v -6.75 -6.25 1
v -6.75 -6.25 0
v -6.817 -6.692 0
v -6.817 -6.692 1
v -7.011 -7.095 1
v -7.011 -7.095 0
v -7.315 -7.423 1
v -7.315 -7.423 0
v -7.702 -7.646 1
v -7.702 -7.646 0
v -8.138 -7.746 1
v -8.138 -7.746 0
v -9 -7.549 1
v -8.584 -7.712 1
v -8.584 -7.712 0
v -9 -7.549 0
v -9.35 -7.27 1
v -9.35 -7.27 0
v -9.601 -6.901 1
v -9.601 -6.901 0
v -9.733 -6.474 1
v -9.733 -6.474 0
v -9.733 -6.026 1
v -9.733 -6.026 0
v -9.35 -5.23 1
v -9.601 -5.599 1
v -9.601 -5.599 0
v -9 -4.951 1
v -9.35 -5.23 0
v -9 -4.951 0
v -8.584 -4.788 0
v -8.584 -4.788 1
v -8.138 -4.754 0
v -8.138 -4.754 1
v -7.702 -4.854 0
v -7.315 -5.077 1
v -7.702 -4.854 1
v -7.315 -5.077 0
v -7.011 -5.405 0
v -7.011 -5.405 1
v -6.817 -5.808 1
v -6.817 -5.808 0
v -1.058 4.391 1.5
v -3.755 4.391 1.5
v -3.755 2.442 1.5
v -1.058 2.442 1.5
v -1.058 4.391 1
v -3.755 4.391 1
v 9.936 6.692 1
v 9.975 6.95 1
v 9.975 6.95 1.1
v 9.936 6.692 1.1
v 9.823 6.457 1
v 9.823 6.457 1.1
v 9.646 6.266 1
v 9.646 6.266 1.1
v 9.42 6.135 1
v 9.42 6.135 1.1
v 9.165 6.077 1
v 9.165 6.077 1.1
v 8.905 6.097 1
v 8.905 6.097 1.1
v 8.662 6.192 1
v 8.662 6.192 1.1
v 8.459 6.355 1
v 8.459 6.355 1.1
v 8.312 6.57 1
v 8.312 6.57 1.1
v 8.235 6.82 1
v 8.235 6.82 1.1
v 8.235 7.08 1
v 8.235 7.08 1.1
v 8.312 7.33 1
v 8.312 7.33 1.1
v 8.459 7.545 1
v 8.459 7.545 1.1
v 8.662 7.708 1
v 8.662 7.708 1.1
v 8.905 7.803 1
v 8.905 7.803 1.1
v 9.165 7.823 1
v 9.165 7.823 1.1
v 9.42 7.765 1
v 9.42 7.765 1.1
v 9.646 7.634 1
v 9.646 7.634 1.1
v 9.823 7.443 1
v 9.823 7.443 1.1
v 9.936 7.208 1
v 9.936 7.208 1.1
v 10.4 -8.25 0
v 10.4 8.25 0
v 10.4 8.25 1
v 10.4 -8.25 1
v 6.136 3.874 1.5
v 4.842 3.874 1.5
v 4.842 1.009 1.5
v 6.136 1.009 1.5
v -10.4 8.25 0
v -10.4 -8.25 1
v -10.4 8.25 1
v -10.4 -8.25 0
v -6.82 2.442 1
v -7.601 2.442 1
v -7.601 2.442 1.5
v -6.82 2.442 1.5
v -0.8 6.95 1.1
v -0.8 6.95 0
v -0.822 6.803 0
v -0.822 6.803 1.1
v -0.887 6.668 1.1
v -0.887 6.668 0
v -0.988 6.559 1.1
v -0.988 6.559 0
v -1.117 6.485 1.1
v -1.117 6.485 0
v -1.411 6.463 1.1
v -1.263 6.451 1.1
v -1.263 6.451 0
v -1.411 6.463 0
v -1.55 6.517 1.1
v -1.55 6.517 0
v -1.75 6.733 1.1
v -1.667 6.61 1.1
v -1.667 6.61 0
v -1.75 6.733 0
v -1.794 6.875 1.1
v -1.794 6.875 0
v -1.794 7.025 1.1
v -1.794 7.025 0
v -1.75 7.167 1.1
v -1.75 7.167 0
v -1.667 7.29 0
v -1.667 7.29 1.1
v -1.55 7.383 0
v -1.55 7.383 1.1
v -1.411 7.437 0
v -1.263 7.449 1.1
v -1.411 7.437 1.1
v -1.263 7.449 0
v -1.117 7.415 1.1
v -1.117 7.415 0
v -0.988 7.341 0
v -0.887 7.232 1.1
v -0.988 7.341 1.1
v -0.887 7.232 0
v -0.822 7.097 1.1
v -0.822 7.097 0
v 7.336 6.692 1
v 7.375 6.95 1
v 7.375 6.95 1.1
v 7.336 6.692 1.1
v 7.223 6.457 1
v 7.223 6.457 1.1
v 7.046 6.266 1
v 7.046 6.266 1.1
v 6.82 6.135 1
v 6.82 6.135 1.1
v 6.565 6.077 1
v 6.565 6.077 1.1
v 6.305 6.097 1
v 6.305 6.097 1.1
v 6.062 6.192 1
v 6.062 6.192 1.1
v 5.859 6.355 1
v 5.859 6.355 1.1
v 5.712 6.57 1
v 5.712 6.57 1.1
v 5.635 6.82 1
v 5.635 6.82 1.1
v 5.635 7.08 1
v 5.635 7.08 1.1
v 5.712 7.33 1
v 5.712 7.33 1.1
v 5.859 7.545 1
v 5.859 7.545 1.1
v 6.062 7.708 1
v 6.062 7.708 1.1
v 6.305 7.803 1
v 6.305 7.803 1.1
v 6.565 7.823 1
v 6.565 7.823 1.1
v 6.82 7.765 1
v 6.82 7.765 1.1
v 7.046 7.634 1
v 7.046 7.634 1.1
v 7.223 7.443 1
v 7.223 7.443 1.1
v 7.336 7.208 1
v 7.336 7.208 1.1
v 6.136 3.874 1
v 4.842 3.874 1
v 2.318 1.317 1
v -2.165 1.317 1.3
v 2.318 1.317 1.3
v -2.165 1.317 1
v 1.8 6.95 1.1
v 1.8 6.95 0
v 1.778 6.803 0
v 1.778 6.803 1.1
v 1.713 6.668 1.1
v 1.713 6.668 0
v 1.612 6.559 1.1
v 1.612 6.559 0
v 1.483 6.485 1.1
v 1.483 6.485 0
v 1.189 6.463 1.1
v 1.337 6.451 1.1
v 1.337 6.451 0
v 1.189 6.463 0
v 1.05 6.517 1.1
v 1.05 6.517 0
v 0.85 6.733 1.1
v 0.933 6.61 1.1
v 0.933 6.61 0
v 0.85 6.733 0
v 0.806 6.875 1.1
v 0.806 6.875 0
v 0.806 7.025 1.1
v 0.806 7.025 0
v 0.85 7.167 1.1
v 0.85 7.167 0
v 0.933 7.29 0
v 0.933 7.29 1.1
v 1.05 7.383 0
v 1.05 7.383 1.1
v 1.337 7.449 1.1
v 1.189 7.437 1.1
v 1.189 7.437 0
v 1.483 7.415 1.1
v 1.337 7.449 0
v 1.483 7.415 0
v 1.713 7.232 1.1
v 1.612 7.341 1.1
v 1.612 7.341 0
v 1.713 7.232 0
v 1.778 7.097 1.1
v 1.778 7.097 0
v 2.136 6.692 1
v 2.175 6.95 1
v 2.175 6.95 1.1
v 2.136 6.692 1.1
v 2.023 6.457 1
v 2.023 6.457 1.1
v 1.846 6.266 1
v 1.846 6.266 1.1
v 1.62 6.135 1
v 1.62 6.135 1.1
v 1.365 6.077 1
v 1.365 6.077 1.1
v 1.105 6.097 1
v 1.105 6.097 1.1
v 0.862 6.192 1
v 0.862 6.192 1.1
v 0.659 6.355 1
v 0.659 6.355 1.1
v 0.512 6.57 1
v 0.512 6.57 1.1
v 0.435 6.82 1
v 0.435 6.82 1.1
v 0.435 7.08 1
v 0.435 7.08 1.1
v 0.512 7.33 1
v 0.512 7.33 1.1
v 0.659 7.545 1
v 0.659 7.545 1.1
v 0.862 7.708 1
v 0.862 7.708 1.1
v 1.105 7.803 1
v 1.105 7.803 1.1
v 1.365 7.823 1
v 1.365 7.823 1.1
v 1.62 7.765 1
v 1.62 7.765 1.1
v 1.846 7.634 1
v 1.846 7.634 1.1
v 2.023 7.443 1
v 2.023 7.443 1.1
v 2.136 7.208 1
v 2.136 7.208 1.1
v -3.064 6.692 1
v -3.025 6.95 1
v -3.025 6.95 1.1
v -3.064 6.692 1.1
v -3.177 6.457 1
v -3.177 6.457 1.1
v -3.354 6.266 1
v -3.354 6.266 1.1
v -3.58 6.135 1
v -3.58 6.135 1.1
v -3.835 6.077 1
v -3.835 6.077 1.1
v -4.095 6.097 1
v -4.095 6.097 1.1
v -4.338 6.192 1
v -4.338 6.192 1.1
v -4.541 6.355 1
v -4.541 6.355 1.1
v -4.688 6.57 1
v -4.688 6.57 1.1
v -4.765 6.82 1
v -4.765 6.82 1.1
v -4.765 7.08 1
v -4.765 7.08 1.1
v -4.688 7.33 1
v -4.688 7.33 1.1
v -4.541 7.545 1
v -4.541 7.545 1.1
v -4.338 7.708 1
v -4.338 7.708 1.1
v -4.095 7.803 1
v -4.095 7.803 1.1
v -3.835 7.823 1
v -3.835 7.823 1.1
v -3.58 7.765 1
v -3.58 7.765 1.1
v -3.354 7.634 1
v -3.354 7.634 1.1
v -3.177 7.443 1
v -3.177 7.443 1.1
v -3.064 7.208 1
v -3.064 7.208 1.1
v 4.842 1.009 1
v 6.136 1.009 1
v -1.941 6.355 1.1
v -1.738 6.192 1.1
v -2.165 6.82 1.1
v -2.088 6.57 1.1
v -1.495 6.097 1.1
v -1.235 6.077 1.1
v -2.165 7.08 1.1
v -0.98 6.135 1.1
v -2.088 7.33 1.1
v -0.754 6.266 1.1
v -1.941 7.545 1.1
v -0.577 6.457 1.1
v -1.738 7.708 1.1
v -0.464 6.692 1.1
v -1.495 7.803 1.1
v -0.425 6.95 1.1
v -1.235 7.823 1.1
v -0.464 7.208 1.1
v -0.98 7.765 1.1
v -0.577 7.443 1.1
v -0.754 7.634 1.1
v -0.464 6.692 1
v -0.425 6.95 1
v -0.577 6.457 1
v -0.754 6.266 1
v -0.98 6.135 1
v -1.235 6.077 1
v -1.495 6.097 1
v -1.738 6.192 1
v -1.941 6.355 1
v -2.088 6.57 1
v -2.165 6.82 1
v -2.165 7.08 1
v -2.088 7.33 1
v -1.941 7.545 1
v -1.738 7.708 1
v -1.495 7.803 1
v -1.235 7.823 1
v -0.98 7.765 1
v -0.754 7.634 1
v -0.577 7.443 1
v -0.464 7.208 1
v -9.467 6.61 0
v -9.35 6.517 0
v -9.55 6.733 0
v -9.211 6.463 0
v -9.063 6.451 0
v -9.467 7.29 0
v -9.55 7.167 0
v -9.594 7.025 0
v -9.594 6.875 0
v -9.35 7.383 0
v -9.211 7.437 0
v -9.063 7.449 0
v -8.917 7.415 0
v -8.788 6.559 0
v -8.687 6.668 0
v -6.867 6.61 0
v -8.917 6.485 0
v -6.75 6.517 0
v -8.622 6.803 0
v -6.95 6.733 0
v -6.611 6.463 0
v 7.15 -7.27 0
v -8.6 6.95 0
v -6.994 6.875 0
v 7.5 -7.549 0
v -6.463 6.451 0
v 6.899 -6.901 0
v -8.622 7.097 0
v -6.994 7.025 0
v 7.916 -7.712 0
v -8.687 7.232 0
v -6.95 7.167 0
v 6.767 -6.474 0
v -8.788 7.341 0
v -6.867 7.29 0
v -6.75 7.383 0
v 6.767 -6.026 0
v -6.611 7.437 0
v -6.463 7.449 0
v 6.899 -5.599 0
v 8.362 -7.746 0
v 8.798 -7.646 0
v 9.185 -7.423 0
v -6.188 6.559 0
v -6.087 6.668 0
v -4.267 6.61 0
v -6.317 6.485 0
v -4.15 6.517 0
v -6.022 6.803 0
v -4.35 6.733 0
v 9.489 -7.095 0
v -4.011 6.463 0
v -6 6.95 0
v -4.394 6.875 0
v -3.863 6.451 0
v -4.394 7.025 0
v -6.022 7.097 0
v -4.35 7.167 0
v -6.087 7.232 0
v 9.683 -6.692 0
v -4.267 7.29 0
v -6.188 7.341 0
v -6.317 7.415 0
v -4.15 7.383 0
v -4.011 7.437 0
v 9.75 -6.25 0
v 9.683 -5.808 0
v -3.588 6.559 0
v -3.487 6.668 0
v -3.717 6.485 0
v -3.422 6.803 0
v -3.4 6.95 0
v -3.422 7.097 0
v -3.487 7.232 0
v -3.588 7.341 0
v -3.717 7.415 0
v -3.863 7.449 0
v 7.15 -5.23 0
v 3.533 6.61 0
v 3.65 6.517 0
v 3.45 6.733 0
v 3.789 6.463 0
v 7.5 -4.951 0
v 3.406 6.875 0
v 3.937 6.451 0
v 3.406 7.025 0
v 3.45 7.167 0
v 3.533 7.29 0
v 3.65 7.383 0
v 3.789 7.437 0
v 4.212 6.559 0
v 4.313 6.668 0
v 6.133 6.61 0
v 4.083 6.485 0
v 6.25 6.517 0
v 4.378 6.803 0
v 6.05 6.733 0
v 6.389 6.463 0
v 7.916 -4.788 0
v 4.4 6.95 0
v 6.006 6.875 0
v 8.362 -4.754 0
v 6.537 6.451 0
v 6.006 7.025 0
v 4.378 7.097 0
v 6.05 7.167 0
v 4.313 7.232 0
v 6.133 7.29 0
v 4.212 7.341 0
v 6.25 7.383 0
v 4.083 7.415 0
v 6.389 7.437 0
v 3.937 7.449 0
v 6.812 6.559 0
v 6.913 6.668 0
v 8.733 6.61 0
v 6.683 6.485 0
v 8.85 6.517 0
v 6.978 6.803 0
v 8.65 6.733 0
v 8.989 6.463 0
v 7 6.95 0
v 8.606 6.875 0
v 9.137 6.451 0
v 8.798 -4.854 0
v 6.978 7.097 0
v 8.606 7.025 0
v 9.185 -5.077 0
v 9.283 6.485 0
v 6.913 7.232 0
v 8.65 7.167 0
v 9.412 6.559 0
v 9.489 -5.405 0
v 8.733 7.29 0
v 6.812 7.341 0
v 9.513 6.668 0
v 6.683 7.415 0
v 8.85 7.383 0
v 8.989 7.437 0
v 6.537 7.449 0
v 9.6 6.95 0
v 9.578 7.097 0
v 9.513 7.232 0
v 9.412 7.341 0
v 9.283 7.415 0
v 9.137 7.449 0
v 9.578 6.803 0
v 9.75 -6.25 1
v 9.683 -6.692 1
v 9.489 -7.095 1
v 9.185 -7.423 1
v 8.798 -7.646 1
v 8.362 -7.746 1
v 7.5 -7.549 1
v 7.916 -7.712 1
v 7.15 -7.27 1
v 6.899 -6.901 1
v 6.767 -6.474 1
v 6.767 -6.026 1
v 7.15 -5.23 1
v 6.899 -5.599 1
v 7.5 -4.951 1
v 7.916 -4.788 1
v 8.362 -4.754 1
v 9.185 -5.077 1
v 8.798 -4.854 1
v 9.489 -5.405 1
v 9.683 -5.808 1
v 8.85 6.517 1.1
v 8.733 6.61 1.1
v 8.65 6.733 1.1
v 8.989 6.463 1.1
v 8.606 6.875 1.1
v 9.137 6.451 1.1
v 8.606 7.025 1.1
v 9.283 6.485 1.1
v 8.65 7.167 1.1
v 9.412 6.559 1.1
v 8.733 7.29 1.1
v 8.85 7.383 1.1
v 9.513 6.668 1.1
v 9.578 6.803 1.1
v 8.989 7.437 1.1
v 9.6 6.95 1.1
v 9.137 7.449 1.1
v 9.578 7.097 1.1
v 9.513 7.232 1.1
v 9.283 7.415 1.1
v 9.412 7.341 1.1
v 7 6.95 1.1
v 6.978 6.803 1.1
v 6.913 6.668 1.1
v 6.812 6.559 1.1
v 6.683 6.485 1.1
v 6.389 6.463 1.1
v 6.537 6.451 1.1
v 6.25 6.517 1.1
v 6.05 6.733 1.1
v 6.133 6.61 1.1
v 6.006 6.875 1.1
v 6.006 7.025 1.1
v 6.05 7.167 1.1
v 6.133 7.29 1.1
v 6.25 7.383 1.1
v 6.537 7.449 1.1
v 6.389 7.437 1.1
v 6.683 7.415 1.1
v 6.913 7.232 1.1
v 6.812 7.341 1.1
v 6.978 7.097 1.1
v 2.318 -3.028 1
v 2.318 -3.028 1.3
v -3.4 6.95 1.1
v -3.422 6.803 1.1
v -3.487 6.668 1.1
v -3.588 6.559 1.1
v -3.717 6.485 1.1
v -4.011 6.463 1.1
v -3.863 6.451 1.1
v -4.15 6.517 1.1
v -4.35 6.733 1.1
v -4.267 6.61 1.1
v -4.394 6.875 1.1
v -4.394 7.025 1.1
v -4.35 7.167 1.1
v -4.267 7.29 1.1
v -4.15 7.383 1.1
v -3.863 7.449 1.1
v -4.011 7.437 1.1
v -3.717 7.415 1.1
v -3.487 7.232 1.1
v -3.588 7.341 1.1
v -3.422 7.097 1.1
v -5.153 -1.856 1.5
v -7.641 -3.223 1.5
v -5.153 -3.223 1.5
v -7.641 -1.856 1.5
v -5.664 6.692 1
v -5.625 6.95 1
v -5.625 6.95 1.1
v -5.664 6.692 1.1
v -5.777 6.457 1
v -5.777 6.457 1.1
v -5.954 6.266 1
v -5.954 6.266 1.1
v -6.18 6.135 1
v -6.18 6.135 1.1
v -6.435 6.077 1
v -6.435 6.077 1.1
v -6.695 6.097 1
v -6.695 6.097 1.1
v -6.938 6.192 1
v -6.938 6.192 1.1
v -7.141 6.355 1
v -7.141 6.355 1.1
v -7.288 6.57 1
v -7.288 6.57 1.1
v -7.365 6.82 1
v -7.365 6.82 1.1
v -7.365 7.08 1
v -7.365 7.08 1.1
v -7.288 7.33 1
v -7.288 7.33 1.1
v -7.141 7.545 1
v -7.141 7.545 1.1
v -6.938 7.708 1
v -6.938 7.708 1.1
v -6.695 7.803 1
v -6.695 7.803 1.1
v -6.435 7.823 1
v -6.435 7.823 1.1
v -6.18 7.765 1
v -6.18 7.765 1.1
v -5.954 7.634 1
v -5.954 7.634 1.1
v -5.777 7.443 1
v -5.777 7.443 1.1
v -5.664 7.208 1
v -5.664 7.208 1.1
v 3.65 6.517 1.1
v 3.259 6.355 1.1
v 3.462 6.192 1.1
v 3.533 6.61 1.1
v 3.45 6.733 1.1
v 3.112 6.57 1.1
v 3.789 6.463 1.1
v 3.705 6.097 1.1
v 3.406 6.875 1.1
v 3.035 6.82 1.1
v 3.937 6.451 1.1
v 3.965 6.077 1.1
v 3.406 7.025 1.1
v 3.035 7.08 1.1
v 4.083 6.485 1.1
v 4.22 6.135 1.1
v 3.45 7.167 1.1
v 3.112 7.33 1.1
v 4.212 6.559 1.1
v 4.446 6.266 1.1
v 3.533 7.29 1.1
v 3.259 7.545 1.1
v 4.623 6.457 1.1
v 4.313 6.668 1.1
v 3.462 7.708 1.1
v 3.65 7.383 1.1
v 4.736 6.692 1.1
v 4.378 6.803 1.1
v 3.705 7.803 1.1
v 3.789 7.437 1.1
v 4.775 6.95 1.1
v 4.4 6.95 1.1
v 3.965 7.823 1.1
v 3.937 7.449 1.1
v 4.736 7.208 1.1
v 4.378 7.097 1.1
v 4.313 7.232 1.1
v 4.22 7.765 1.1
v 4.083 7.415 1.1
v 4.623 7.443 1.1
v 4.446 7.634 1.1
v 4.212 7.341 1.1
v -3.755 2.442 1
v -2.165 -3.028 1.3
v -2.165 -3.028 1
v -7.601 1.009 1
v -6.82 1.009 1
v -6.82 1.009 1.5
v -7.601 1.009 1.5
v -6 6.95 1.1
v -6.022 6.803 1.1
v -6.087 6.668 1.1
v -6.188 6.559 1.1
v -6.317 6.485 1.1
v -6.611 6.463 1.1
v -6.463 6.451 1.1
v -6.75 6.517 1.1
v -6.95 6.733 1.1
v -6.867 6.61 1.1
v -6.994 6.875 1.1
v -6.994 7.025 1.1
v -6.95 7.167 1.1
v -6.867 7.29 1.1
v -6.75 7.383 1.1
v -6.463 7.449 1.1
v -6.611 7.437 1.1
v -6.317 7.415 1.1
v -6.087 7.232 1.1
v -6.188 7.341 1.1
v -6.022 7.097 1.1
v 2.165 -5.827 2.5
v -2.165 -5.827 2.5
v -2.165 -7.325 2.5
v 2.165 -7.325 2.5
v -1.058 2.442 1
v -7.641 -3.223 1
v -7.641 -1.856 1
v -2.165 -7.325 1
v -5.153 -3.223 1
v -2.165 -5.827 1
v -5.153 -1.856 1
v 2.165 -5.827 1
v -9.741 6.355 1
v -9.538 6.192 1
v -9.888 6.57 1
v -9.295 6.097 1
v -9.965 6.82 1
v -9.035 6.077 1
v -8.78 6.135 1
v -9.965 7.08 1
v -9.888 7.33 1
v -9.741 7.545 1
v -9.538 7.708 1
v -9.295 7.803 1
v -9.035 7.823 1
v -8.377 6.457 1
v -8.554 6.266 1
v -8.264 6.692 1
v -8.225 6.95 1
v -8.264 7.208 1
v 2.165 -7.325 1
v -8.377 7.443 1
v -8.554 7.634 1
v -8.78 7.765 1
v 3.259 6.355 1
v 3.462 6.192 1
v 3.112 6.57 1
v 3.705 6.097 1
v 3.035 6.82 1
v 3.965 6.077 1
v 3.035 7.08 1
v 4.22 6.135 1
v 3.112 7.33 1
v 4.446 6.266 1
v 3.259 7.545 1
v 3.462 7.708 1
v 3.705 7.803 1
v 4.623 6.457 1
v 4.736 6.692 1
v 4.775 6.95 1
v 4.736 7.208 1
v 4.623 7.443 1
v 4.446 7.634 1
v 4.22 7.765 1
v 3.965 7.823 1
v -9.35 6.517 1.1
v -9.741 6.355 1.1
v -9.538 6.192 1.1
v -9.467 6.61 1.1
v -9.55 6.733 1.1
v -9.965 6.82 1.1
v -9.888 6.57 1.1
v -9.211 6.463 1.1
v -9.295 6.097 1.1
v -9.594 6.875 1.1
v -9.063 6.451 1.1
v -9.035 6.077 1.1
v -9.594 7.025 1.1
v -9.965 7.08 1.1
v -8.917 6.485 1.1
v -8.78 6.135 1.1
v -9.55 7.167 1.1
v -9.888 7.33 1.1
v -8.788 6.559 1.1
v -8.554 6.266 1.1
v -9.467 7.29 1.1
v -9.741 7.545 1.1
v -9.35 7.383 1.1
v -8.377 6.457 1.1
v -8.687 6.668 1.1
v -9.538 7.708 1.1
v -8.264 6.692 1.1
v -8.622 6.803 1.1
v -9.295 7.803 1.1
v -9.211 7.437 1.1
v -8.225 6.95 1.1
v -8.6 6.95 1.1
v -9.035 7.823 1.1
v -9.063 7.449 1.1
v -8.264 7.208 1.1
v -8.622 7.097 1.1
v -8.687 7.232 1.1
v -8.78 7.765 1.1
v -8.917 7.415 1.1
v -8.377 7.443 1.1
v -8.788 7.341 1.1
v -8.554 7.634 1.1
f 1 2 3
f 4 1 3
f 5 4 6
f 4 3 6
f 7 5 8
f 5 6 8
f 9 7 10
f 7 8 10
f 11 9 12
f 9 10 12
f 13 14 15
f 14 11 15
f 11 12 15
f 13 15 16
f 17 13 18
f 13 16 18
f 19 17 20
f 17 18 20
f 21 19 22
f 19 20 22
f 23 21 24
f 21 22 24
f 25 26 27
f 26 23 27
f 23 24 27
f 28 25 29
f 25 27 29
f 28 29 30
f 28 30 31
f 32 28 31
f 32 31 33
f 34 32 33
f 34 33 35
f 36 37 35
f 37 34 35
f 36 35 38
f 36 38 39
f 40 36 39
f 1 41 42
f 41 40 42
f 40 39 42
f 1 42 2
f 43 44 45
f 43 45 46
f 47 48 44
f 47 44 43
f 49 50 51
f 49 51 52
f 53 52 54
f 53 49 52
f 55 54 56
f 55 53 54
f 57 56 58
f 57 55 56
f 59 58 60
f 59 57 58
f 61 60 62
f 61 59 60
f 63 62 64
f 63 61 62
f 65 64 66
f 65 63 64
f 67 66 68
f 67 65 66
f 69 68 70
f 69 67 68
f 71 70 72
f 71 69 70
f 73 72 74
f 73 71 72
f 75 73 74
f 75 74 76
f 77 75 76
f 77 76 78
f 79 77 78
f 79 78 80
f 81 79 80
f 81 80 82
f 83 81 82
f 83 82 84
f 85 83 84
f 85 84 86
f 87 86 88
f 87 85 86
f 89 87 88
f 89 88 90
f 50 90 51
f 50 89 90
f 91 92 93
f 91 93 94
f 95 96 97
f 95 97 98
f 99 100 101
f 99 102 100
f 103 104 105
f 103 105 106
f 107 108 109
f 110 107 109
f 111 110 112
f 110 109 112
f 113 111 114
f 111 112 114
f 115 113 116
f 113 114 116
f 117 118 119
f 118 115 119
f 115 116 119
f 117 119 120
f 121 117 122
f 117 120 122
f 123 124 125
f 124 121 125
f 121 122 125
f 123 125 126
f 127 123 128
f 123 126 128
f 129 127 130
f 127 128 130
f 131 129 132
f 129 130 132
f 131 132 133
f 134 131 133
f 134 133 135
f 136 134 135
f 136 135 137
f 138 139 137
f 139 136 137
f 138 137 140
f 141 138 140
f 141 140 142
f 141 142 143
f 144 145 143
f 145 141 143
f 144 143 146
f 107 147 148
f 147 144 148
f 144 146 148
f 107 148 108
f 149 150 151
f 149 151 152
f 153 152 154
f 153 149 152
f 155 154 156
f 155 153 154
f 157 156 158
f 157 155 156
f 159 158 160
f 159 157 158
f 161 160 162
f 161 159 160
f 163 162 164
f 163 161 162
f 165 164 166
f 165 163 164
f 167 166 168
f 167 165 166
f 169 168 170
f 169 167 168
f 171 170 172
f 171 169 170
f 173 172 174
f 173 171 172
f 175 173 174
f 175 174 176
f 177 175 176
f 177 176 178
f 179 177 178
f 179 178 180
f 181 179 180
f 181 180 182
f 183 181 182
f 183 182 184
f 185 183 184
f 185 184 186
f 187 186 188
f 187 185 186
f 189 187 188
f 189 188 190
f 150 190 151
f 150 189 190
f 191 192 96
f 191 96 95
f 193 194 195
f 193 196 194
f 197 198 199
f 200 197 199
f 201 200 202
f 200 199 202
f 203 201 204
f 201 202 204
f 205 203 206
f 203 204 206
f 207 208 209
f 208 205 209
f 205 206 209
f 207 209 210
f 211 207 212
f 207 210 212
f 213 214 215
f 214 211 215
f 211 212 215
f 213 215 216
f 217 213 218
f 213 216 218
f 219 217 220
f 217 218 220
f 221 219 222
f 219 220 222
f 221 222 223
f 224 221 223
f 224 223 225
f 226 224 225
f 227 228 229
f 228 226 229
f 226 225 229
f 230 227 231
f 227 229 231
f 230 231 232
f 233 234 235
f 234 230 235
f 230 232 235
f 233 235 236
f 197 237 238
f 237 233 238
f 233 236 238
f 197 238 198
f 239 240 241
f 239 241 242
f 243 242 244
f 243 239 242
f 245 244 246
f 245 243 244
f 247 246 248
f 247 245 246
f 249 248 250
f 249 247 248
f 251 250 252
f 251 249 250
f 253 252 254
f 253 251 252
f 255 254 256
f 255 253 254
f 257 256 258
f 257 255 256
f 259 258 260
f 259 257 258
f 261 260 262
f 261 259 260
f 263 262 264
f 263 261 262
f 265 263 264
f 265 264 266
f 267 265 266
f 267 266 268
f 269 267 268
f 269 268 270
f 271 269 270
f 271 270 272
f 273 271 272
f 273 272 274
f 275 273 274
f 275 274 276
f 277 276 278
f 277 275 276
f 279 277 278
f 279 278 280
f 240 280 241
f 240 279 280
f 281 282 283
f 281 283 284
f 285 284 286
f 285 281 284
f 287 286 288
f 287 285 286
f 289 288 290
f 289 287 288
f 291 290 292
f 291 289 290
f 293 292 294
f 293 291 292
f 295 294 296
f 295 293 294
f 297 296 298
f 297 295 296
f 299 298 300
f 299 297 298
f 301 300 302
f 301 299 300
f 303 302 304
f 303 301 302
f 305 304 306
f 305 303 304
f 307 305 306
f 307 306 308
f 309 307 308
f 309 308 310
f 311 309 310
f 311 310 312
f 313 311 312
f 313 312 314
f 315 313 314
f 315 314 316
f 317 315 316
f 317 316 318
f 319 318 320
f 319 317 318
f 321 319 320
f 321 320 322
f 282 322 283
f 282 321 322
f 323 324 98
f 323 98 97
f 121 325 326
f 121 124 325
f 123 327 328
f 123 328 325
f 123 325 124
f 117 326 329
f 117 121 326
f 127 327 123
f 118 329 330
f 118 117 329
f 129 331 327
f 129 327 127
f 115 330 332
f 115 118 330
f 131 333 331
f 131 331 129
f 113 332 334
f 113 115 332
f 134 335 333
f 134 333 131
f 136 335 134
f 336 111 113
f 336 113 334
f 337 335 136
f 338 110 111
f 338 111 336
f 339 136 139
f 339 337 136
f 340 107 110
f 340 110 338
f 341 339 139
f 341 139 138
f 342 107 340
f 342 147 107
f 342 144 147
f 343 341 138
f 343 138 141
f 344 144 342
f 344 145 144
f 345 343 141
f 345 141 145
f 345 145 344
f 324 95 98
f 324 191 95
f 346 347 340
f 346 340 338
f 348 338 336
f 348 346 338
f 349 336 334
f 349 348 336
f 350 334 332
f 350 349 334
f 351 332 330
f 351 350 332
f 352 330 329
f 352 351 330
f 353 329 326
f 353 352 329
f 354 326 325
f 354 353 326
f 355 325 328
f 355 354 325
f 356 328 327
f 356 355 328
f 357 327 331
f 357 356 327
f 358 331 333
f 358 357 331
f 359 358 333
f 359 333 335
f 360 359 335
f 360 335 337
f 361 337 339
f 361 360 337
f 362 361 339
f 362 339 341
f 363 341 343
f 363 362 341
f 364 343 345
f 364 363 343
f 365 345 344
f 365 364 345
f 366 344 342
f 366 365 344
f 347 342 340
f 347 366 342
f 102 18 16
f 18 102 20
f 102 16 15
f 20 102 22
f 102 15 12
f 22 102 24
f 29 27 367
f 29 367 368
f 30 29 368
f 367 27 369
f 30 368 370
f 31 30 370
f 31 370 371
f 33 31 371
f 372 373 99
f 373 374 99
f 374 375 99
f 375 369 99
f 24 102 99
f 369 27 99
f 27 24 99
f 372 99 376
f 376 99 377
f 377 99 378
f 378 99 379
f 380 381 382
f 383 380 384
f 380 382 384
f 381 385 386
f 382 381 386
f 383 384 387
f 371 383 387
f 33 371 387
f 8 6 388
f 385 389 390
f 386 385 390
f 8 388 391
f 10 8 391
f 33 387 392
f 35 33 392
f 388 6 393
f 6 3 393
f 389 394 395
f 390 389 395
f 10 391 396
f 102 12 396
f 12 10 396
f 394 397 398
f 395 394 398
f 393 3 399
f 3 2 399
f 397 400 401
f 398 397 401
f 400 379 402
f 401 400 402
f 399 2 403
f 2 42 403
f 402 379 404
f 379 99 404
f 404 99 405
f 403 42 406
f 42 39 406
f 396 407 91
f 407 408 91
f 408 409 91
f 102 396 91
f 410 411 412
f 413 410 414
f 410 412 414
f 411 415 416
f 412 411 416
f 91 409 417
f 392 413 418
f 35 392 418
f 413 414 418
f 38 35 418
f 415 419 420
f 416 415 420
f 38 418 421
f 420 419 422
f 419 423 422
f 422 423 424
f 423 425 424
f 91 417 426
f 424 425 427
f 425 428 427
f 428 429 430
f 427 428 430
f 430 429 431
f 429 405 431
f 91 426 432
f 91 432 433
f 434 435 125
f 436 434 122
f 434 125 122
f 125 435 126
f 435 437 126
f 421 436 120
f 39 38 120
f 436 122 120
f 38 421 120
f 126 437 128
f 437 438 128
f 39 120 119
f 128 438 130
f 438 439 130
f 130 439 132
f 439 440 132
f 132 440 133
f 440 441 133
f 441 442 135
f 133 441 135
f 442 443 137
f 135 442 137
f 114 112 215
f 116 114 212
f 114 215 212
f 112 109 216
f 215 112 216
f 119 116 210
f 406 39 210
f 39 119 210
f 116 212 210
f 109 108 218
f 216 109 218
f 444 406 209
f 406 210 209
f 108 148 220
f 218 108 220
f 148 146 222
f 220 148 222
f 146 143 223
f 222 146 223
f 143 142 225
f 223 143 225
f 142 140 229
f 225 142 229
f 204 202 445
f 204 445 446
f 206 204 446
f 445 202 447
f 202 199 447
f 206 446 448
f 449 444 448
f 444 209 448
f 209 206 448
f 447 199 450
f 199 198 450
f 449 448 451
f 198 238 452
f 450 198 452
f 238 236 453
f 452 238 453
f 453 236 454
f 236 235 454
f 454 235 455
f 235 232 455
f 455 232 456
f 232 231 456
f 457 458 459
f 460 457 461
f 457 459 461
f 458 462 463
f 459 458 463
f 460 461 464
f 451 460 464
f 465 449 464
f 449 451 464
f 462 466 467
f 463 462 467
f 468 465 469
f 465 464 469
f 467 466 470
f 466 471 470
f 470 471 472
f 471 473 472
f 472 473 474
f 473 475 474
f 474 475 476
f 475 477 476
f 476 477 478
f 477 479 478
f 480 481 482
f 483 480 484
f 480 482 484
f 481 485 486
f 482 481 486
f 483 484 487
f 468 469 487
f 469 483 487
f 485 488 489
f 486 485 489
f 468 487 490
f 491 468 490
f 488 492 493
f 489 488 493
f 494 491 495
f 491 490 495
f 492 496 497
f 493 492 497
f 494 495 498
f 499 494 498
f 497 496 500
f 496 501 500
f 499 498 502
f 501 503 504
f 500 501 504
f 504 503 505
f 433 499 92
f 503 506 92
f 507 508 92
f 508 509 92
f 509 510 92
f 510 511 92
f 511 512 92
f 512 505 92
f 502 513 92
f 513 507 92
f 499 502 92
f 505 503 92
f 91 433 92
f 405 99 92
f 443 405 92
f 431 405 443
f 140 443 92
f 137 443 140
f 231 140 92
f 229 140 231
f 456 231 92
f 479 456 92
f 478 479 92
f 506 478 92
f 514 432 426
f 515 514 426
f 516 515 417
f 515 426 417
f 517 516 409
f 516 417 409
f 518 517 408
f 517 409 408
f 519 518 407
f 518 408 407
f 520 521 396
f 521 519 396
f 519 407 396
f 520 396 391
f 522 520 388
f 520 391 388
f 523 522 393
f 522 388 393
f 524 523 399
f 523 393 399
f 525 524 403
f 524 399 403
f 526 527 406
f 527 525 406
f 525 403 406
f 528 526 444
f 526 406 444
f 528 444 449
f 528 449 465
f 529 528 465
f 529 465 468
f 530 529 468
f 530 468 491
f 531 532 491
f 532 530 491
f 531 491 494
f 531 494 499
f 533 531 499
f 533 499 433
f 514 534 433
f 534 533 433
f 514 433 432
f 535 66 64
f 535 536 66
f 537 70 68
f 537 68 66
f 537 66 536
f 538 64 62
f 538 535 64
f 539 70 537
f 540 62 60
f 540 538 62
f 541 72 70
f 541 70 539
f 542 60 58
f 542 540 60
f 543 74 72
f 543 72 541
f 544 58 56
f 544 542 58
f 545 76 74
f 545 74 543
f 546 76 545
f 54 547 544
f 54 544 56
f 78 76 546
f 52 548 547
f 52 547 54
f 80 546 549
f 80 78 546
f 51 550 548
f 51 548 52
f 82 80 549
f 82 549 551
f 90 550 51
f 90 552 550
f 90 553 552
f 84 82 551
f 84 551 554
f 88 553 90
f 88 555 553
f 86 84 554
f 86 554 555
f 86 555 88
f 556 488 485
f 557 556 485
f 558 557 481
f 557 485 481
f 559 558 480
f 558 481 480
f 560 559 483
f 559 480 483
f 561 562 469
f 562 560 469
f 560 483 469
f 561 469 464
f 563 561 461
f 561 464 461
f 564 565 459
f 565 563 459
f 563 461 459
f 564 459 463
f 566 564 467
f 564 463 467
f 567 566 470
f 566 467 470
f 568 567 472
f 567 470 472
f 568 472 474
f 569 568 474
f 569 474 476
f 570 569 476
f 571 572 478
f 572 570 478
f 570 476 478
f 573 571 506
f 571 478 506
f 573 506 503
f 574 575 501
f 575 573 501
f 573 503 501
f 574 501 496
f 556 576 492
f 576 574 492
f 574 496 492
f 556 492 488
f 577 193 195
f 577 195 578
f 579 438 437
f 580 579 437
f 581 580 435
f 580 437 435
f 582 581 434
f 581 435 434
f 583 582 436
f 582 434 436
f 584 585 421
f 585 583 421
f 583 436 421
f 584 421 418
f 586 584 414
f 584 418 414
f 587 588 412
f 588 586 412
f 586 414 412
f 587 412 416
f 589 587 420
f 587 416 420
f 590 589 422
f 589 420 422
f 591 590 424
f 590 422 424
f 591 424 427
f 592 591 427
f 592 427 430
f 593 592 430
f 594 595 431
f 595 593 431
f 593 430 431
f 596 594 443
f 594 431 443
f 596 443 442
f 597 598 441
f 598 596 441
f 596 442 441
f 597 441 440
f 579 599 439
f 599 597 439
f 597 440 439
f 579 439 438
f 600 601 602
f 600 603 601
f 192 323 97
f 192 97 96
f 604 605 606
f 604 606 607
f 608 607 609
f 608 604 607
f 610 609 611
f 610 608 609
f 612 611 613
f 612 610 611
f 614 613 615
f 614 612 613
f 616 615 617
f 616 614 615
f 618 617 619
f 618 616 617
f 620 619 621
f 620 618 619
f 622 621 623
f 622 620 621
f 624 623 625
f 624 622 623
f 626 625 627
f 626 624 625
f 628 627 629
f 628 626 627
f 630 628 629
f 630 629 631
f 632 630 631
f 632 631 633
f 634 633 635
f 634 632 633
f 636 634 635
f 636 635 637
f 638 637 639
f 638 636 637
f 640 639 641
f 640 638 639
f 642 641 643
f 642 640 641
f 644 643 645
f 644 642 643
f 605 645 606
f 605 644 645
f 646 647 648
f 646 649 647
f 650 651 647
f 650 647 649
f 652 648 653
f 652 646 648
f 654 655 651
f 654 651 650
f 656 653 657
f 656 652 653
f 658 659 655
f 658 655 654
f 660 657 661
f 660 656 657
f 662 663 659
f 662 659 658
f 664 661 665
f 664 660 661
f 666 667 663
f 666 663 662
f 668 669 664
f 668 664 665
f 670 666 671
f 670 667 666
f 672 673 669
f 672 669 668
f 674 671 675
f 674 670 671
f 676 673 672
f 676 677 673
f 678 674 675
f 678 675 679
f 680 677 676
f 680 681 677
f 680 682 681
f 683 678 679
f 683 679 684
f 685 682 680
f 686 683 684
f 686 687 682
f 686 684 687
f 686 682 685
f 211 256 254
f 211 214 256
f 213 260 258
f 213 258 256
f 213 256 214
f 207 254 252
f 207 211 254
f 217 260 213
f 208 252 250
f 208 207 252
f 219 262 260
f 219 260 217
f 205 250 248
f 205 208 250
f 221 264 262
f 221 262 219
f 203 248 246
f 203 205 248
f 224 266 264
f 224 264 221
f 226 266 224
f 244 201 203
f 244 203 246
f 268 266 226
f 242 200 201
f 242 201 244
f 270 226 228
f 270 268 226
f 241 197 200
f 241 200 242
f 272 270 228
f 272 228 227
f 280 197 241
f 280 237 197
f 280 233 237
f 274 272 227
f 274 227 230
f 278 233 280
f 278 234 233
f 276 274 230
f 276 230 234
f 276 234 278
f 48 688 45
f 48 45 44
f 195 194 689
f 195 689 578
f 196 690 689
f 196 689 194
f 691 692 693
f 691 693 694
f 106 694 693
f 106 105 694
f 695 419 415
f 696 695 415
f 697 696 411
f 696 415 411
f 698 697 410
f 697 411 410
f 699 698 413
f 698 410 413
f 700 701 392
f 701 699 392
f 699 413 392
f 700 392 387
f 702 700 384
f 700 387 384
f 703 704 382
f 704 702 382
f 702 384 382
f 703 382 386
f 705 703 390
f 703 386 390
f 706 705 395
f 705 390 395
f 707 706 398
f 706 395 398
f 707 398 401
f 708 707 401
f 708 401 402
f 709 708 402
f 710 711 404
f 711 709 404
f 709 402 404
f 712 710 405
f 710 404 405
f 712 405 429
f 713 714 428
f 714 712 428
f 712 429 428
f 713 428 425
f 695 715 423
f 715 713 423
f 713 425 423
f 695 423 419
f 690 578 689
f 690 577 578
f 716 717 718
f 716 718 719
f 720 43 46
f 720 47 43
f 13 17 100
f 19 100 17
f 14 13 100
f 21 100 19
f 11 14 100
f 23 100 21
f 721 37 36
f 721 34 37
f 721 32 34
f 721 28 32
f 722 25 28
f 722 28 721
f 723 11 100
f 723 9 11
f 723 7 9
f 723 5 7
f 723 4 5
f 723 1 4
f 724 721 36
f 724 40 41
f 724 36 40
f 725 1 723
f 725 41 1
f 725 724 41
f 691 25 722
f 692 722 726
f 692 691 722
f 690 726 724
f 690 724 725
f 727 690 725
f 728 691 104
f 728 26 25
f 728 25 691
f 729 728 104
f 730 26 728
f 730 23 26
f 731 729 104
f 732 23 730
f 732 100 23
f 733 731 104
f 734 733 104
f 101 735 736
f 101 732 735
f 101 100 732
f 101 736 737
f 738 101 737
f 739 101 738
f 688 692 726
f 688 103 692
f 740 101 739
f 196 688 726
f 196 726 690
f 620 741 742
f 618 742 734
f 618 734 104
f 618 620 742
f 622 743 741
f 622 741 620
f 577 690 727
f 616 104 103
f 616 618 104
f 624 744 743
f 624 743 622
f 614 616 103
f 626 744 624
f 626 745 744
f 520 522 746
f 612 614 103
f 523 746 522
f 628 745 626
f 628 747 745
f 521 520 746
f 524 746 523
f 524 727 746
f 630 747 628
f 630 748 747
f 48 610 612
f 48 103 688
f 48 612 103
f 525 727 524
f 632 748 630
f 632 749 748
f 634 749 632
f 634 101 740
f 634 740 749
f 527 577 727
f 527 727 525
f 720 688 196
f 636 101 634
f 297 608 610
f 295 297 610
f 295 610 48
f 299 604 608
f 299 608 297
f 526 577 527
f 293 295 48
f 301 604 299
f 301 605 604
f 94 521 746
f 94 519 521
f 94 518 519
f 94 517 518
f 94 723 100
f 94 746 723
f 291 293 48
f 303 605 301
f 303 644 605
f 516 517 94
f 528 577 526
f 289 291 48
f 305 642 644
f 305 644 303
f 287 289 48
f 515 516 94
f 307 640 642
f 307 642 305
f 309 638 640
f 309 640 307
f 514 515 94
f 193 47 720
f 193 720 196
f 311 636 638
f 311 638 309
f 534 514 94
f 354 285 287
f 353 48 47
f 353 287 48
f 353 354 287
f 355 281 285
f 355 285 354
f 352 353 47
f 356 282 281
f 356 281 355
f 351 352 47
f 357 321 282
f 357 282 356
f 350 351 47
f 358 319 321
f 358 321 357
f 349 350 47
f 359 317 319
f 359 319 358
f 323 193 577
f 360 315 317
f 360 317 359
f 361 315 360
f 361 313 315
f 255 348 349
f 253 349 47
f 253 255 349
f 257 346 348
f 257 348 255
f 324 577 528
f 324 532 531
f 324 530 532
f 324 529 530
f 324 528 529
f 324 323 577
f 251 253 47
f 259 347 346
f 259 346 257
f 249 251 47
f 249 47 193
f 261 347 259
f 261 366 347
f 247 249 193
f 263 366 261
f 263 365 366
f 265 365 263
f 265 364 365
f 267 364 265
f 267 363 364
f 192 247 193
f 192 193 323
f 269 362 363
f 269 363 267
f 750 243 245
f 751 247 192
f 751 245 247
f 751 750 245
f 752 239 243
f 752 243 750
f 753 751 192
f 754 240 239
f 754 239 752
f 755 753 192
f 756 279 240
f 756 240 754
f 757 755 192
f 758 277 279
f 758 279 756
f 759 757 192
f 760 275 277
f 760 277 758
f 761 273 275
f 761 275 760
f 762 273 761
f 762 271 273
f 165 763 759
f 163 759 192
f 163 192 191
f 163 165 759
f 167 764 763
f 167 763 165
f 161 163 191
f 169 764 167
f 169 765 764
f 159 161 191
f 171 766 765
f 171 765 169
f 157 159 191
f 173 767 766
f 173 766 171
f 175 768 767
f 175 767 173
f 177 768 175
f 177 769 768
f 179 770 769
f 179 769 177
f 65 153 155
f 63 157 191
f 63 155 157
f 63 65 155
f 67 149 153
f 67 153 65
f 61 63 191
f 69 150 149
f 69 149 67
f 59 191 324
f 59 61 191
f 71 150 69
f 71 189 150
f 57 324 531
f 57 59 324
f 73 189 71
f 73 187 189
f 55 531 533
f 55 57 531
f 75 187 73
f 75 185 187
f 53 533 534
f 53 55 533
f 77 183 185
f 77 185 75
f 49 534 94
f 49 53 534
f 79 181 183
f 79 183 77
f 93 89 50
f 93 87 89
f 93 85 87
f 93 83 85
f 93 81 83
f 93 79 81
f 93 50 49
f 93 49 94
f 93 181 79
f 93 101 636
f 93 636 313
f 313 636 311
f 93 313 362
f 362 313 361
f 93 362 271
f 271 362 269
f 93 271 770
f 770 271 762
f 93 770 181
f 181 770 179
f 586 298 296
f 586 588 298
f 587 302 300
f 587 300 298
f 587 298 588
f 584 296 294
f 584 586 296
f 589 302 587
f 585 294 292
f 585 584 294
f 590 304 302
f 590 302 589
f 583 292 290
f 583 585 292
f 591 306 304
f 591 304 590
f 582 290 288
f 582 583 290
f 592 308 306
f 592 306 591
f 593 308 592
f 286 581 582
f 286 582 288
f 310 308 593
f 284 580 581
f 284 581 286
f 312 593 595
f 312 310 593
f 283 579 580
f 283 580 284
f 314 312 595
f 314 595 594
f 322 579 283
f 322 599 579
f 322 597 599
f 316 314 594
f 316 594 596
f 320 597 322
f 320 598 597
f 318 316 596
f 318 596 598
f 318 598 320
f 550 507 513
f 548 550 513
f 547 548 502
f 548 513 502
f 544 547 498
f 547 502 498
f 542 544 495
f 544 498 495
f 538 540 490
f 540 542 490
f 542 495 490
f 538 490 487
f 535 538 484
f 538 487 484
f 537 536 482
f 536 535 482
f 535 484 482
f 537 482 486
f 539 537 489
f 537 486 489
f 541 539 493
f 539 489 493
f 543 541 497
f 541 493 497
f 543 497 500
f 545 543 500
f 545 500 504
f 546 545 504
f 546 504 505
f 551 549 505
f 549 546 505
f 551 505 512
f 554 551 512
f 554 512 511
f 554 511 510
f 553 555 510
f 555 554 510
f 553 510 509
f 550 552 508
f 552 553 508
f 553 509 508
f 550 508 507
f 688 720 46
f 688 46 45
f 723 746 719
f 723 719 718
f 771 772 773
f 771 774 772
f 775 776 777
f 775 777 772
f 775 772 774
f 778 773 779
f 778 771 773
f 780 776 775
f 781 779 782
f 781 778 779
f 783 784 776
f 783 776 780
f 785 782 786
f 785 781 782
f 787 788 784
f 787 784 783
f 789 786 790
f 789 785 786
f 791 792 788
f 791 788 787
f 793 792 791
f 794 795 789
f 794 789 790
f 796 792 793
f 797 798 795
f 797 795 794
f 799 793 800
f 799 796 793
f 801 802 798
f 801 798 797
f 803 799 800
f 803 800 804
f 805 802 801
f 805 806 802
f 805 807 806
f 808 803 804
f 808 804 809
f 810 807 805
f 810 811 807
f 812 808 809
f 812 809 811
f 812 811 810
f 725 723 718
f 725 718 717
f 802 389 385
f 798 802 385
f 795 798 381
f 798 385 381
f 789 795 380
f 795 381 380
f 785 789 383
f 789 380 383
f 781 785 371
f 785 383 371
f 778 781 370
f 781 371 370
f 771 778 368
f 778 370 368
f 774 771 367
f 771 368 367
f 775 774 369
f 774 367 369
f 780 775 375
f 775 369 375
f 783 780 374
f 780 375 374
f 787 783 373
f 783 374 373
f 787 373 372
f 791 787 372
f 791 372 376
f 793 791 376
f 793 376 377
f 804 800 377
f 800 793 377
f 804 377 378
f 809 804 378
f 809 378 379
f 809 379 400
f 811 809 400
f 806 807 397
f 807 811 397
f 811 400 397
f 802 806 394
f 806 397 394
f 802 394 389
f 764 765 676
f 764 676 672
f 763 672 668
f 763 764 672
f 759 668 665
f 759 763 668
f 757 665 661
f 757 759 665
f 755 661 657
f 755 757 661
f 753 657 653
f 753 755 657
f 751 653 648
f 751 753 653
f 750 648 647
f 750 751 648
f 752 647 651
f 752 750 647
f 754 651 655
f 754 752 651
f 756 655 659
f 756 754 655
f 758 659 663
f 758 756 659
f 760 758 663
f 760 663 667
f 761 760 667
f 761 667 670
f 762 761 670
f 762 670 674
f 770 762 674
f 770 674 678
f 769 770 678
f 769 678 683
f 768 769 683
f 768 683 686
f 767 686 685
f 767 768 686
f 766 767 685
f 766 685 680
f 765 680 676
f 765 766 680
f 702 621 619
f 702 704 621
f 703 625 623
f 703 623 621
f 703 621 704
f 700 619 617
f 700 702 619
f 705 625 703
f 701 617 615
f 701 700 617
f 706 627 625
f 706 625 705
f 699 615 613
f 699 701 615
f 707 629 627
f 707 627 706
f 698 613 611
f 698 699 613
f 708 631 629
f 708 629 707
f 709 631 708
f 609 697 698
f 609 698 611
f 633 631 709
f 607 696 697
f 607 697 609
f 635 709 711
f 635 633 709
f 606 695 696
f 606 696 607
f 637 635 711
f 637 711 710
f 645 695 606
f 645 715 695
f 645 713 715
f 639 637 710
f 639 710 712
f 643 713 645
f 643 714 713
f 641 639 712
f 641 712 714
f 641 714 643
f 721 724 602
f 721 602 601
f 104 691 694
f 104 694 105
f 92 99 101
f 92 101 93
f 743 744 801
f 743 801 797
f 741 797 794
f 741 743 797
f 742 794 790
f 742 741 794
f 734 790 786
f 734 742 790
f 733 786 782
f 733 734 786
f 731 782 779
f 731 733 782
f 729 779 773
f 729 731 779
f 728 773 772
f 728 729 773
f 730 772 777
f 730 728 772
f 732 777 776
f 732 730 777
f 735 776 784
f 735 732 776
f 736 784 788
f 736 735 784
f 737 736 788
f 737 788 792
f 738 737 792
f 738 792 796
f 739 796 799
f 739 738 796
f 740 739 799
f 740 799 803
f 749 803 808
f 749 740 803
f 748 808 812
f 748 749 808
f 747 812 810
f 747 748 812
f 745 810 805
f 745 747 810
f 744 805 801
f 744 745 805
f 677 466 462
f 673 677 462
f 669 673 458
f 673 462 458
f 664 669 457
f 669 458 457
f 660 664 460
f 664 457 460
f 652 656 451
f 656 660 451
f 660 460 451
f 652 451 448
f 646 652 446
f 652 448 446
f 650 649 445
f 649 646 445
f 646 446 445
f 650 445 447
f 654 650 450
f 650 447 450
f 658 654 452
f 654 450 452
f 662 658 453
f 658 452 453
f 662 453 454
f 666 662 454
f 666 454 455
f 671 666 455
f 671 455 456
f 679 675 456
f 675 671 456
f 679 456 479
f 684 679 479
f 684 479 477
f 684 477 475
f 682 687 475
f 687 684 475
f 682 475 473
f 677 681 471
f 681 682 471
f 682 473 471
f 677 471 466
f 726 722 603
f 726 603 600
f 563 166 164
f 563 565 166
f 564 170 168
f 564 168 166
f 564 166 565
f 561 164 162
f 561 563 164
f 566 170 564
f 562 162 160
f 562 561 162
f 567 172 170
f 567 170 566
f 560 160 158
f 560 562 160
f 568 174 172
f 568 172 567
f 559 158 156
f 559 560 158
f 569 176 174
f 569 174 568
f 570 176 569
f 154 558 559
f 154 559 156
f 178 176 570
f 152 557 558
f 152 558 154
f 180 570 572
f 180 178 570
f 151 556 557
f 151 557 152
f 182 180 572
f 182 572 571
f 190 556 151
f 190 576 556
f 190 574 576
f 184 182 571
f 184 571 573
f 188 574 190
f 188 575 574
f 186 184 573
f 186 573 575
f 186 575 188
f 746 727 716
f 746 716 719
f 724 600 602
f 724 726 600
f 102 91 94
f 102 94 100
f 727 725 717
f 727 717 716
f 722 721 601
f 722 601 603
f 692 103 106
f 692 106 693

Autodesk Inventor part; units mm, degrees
ref_plane "YZ Plane" through (0, 0, 0) normal (1, 0, 0) x (0, 1, 0)
ref_plane "XZ Plane" through (0, 0, 0) normal (0, 1, 0) x (-1, 0, 0)
ref_plane "XY Plane" through (0, 0, 0) normal (0, 0, 1) x (1, 0, 0)
sketch "Эскиз1" plane through (0, 0, 0) normal (0, 0, 1) x (1, 0, 0)
  line L0 (10.4, -8.25) -> (-10.4, -8.25)
  line L1 (-10.4, -8.25) -> (-10.4, 8.25)
  line L2 (-10.4, 8.25) -> (10.4, 8.25)
  line L3 (10.4, 8.25) -> (10.4, -8.25)
  line L4 (10.4, -8.25) -> (-10.4, 8.25) construction
  line L5 (-10.4, -8.25) -> (10.4, 8.25) construction
  circle A0 centre (-8.25, -6.25) radius 1.5
  circle A1 centre (8.25, -6.25) radius 1.5
  circle A2 centre (-9.1, 6.95) radius 0.5
  circle A3 centre (-9.1, 6.95) radius 0.875
  line L6 (-10.4, 6.95) -> (10.4, 6.95) construction
  point P0 (0, 0)
  dimension "d0" = 20.8
  dimension "d1" = 16.5
  dimension "d2" = 3
  dimension "d3" = 3
  dimension "d4" = 13.5
  dimension "d5" = 0.5
  dimension "d8" = 2.15
  dimension "d9" = 2.15
  dimension "d10" = 1
  dimension "d11" = 1.75
  dimension "d12" = 1.3
  dimension "d13" = 1.3
extrude "Выдавливание1" add sketch "Эскиз1" along normal blind 1 contours L0 L1 L2 L3 | A2 | A3
extrude "Выдавливание2" cut sketch "Эскиз1" along normal blind 1.5 contours A2
extrude "Выдавливание3" add sketch "Эскиз1" along normal blind 0.1 from surface at 1 contours A3
pattern_linear "Прямоуг.массив1" count 8 spacing 2.6 along (1, 0, 0) of "Выдавливание3", "Выдавливание2"
sketch "Эскиз2" plane through (0, 0, 1) normal (0, 0, 1) x (1, 0, 0)
  line L0 (2.3179, -3.0275) -> (-2.1648, -3.0275)
  line L1 (-2.1648, -3.0275) -> (-2.1648, 1.3166)
  line L2 (-2.1648, 1.3166) -> (2.3179, 1.3166)
  line L3 (2.3179, 1.3166) -> (2.3179, -3.0275)
  line L4 (2.3179, -3.0275) -> (-2.1648, 1.3166) construction
  line L5 (-2.1648, -3.0275) -> (2.3179, 1.3166) construction
  line L6 (-2.1648, -5.8271) -> (2.1648, -5.8271)
  line L7 (2.1648, -5.8271) -> (2.1648, -7.3246)
  line L8 (2.1648, -7.3246) -> (-2.1648, -7.3246)
  line L9 (-2.1648, -7.3246) -> (-2.1648, -5.8271)
  line L10 (-2.1648, -5.8271) -> (2.1648, -7.3246) construction
  line L11 (2.1648, -5.8271) -> (-2.1648, -7.3246) construction
  line L12 (-7.6013, 2.4415) -> (-6.82, 2.4415)
  line L13 (-6.82, 2.4415) -> (-6.82, 1.0092)
  line L14 (-6.82, 1.0092) -> (-7.6013, 1.0092)
  line L15 (-7.6013, 1.0092) -> (-7.6013, 2.4415)
  line L16 (-7.6013, 2.4415) -> (-6.82, 1.0092) construction
  line L17 (-6.82, 2.4415) -> (-7.6013, 1.0092) construction
  line L18 (4.8419, 3.8739) -> (6.1364, 3.8739)
  line L19 (6.1364, 3.8739) -> (6.1364, 1.0092)
  line L20 (6.1364, 1.0092) -> (4.8419, 1.0092)
  line L21 (4.8419, 1.0092) -> (4.8419, 3.8739)
  line L22 (4.8419, 3.8739) -> (6.1364, 1.0092) construction
  line L23 (6.1364, 3.8739) -> (4.8419, 1.0092) construction
  line L24 (-3.7552, 4.3914) -> (-1.058, 4.3914)
  line L25 (-1.058, 4.3914) -> (-1.058, 2.4415)
  line L26 (-1.058, 2.4415) -> (-3.7552, 2.4415)
  line L27 (-3.7552, 2.4415) -> (-3.7552, 4.3914)
  line L28 (-3.7552, 4.3914) -> (-1.058, 2.4415) construction
  line L29 (-1.058, 4.3914) -> (-3.7552, 2.4415) construction
  line L30 (-7.6406, -1.8556) -> (-5.153, -1.8556)
  line L31 (-5.153, -1.8556) -> (-5.153, -3.2228)
  line L32 (-5.153, -3.2228) -> (-7.6406, -3.2228)
  line L33 (-7.6406, -3.2228) -> (-7.6406, -1.8556)
  line L34 (-7.6406, -1.8556) -> (-5.153, -3.2228) construction
  line L35 (-5.153, -1.8556) -> (-7.6406, -3.2228) construction
  point P0 (0, 0)
  point P1 (0.0765, -0.8555)
  point P2 (0, -6.5758)
  point P3 (-7.2106, 1.7253)
  point P4 (5.4892, 2.4415)
  point P5 (-2.4066, 3.4165)
  point P6 (-6.3968, -2.5392)
extrude "Выдавливание4" add sketch "Эскиз2" along normal blind 0.3 contours L0 L1 L2 L3
extrude "Выдавливание5" add sketch "Эскиз2" along normal blind 1.5 contours L6 L7 L8 L9
extrude "Выдавливание6" add sketch "Эскиз2" along normal blind 0.5 contours L12 L13 L14 L15 | L18 L19 L20 L21 | L24 L25 L26 L27 | L30 L31 L32 L33
sketch "Эскиз3" plane through (0, 0, 1.3) normal (0, 0, 1) x (1, 0, 0)
  line L0 (2.3179, 1.3166) -> (-2.1648, 1.3166) construction
  line L1 (-2.1648, 1.3166) -> (-2.1648, -3.0275) construction
  line L2 (-2.1648, -3.0275) -> (2.3179, -3.0275) construction
  line L3 (2.3179, -3.0275) -> (2.3179, 1.3166) construction
  point P0 (0, 0)
  point P1 (0.0765, -0.8555)
  point P2 (0.0765, 1.3166)
  point P3 (2.3179, -0.8555)
equation "\"d8\" = d9"
equation "\"d13\" = 0.0625 * d0"
equation "\"d22\" = 2 * d13"
properties part number "MPU6050"
